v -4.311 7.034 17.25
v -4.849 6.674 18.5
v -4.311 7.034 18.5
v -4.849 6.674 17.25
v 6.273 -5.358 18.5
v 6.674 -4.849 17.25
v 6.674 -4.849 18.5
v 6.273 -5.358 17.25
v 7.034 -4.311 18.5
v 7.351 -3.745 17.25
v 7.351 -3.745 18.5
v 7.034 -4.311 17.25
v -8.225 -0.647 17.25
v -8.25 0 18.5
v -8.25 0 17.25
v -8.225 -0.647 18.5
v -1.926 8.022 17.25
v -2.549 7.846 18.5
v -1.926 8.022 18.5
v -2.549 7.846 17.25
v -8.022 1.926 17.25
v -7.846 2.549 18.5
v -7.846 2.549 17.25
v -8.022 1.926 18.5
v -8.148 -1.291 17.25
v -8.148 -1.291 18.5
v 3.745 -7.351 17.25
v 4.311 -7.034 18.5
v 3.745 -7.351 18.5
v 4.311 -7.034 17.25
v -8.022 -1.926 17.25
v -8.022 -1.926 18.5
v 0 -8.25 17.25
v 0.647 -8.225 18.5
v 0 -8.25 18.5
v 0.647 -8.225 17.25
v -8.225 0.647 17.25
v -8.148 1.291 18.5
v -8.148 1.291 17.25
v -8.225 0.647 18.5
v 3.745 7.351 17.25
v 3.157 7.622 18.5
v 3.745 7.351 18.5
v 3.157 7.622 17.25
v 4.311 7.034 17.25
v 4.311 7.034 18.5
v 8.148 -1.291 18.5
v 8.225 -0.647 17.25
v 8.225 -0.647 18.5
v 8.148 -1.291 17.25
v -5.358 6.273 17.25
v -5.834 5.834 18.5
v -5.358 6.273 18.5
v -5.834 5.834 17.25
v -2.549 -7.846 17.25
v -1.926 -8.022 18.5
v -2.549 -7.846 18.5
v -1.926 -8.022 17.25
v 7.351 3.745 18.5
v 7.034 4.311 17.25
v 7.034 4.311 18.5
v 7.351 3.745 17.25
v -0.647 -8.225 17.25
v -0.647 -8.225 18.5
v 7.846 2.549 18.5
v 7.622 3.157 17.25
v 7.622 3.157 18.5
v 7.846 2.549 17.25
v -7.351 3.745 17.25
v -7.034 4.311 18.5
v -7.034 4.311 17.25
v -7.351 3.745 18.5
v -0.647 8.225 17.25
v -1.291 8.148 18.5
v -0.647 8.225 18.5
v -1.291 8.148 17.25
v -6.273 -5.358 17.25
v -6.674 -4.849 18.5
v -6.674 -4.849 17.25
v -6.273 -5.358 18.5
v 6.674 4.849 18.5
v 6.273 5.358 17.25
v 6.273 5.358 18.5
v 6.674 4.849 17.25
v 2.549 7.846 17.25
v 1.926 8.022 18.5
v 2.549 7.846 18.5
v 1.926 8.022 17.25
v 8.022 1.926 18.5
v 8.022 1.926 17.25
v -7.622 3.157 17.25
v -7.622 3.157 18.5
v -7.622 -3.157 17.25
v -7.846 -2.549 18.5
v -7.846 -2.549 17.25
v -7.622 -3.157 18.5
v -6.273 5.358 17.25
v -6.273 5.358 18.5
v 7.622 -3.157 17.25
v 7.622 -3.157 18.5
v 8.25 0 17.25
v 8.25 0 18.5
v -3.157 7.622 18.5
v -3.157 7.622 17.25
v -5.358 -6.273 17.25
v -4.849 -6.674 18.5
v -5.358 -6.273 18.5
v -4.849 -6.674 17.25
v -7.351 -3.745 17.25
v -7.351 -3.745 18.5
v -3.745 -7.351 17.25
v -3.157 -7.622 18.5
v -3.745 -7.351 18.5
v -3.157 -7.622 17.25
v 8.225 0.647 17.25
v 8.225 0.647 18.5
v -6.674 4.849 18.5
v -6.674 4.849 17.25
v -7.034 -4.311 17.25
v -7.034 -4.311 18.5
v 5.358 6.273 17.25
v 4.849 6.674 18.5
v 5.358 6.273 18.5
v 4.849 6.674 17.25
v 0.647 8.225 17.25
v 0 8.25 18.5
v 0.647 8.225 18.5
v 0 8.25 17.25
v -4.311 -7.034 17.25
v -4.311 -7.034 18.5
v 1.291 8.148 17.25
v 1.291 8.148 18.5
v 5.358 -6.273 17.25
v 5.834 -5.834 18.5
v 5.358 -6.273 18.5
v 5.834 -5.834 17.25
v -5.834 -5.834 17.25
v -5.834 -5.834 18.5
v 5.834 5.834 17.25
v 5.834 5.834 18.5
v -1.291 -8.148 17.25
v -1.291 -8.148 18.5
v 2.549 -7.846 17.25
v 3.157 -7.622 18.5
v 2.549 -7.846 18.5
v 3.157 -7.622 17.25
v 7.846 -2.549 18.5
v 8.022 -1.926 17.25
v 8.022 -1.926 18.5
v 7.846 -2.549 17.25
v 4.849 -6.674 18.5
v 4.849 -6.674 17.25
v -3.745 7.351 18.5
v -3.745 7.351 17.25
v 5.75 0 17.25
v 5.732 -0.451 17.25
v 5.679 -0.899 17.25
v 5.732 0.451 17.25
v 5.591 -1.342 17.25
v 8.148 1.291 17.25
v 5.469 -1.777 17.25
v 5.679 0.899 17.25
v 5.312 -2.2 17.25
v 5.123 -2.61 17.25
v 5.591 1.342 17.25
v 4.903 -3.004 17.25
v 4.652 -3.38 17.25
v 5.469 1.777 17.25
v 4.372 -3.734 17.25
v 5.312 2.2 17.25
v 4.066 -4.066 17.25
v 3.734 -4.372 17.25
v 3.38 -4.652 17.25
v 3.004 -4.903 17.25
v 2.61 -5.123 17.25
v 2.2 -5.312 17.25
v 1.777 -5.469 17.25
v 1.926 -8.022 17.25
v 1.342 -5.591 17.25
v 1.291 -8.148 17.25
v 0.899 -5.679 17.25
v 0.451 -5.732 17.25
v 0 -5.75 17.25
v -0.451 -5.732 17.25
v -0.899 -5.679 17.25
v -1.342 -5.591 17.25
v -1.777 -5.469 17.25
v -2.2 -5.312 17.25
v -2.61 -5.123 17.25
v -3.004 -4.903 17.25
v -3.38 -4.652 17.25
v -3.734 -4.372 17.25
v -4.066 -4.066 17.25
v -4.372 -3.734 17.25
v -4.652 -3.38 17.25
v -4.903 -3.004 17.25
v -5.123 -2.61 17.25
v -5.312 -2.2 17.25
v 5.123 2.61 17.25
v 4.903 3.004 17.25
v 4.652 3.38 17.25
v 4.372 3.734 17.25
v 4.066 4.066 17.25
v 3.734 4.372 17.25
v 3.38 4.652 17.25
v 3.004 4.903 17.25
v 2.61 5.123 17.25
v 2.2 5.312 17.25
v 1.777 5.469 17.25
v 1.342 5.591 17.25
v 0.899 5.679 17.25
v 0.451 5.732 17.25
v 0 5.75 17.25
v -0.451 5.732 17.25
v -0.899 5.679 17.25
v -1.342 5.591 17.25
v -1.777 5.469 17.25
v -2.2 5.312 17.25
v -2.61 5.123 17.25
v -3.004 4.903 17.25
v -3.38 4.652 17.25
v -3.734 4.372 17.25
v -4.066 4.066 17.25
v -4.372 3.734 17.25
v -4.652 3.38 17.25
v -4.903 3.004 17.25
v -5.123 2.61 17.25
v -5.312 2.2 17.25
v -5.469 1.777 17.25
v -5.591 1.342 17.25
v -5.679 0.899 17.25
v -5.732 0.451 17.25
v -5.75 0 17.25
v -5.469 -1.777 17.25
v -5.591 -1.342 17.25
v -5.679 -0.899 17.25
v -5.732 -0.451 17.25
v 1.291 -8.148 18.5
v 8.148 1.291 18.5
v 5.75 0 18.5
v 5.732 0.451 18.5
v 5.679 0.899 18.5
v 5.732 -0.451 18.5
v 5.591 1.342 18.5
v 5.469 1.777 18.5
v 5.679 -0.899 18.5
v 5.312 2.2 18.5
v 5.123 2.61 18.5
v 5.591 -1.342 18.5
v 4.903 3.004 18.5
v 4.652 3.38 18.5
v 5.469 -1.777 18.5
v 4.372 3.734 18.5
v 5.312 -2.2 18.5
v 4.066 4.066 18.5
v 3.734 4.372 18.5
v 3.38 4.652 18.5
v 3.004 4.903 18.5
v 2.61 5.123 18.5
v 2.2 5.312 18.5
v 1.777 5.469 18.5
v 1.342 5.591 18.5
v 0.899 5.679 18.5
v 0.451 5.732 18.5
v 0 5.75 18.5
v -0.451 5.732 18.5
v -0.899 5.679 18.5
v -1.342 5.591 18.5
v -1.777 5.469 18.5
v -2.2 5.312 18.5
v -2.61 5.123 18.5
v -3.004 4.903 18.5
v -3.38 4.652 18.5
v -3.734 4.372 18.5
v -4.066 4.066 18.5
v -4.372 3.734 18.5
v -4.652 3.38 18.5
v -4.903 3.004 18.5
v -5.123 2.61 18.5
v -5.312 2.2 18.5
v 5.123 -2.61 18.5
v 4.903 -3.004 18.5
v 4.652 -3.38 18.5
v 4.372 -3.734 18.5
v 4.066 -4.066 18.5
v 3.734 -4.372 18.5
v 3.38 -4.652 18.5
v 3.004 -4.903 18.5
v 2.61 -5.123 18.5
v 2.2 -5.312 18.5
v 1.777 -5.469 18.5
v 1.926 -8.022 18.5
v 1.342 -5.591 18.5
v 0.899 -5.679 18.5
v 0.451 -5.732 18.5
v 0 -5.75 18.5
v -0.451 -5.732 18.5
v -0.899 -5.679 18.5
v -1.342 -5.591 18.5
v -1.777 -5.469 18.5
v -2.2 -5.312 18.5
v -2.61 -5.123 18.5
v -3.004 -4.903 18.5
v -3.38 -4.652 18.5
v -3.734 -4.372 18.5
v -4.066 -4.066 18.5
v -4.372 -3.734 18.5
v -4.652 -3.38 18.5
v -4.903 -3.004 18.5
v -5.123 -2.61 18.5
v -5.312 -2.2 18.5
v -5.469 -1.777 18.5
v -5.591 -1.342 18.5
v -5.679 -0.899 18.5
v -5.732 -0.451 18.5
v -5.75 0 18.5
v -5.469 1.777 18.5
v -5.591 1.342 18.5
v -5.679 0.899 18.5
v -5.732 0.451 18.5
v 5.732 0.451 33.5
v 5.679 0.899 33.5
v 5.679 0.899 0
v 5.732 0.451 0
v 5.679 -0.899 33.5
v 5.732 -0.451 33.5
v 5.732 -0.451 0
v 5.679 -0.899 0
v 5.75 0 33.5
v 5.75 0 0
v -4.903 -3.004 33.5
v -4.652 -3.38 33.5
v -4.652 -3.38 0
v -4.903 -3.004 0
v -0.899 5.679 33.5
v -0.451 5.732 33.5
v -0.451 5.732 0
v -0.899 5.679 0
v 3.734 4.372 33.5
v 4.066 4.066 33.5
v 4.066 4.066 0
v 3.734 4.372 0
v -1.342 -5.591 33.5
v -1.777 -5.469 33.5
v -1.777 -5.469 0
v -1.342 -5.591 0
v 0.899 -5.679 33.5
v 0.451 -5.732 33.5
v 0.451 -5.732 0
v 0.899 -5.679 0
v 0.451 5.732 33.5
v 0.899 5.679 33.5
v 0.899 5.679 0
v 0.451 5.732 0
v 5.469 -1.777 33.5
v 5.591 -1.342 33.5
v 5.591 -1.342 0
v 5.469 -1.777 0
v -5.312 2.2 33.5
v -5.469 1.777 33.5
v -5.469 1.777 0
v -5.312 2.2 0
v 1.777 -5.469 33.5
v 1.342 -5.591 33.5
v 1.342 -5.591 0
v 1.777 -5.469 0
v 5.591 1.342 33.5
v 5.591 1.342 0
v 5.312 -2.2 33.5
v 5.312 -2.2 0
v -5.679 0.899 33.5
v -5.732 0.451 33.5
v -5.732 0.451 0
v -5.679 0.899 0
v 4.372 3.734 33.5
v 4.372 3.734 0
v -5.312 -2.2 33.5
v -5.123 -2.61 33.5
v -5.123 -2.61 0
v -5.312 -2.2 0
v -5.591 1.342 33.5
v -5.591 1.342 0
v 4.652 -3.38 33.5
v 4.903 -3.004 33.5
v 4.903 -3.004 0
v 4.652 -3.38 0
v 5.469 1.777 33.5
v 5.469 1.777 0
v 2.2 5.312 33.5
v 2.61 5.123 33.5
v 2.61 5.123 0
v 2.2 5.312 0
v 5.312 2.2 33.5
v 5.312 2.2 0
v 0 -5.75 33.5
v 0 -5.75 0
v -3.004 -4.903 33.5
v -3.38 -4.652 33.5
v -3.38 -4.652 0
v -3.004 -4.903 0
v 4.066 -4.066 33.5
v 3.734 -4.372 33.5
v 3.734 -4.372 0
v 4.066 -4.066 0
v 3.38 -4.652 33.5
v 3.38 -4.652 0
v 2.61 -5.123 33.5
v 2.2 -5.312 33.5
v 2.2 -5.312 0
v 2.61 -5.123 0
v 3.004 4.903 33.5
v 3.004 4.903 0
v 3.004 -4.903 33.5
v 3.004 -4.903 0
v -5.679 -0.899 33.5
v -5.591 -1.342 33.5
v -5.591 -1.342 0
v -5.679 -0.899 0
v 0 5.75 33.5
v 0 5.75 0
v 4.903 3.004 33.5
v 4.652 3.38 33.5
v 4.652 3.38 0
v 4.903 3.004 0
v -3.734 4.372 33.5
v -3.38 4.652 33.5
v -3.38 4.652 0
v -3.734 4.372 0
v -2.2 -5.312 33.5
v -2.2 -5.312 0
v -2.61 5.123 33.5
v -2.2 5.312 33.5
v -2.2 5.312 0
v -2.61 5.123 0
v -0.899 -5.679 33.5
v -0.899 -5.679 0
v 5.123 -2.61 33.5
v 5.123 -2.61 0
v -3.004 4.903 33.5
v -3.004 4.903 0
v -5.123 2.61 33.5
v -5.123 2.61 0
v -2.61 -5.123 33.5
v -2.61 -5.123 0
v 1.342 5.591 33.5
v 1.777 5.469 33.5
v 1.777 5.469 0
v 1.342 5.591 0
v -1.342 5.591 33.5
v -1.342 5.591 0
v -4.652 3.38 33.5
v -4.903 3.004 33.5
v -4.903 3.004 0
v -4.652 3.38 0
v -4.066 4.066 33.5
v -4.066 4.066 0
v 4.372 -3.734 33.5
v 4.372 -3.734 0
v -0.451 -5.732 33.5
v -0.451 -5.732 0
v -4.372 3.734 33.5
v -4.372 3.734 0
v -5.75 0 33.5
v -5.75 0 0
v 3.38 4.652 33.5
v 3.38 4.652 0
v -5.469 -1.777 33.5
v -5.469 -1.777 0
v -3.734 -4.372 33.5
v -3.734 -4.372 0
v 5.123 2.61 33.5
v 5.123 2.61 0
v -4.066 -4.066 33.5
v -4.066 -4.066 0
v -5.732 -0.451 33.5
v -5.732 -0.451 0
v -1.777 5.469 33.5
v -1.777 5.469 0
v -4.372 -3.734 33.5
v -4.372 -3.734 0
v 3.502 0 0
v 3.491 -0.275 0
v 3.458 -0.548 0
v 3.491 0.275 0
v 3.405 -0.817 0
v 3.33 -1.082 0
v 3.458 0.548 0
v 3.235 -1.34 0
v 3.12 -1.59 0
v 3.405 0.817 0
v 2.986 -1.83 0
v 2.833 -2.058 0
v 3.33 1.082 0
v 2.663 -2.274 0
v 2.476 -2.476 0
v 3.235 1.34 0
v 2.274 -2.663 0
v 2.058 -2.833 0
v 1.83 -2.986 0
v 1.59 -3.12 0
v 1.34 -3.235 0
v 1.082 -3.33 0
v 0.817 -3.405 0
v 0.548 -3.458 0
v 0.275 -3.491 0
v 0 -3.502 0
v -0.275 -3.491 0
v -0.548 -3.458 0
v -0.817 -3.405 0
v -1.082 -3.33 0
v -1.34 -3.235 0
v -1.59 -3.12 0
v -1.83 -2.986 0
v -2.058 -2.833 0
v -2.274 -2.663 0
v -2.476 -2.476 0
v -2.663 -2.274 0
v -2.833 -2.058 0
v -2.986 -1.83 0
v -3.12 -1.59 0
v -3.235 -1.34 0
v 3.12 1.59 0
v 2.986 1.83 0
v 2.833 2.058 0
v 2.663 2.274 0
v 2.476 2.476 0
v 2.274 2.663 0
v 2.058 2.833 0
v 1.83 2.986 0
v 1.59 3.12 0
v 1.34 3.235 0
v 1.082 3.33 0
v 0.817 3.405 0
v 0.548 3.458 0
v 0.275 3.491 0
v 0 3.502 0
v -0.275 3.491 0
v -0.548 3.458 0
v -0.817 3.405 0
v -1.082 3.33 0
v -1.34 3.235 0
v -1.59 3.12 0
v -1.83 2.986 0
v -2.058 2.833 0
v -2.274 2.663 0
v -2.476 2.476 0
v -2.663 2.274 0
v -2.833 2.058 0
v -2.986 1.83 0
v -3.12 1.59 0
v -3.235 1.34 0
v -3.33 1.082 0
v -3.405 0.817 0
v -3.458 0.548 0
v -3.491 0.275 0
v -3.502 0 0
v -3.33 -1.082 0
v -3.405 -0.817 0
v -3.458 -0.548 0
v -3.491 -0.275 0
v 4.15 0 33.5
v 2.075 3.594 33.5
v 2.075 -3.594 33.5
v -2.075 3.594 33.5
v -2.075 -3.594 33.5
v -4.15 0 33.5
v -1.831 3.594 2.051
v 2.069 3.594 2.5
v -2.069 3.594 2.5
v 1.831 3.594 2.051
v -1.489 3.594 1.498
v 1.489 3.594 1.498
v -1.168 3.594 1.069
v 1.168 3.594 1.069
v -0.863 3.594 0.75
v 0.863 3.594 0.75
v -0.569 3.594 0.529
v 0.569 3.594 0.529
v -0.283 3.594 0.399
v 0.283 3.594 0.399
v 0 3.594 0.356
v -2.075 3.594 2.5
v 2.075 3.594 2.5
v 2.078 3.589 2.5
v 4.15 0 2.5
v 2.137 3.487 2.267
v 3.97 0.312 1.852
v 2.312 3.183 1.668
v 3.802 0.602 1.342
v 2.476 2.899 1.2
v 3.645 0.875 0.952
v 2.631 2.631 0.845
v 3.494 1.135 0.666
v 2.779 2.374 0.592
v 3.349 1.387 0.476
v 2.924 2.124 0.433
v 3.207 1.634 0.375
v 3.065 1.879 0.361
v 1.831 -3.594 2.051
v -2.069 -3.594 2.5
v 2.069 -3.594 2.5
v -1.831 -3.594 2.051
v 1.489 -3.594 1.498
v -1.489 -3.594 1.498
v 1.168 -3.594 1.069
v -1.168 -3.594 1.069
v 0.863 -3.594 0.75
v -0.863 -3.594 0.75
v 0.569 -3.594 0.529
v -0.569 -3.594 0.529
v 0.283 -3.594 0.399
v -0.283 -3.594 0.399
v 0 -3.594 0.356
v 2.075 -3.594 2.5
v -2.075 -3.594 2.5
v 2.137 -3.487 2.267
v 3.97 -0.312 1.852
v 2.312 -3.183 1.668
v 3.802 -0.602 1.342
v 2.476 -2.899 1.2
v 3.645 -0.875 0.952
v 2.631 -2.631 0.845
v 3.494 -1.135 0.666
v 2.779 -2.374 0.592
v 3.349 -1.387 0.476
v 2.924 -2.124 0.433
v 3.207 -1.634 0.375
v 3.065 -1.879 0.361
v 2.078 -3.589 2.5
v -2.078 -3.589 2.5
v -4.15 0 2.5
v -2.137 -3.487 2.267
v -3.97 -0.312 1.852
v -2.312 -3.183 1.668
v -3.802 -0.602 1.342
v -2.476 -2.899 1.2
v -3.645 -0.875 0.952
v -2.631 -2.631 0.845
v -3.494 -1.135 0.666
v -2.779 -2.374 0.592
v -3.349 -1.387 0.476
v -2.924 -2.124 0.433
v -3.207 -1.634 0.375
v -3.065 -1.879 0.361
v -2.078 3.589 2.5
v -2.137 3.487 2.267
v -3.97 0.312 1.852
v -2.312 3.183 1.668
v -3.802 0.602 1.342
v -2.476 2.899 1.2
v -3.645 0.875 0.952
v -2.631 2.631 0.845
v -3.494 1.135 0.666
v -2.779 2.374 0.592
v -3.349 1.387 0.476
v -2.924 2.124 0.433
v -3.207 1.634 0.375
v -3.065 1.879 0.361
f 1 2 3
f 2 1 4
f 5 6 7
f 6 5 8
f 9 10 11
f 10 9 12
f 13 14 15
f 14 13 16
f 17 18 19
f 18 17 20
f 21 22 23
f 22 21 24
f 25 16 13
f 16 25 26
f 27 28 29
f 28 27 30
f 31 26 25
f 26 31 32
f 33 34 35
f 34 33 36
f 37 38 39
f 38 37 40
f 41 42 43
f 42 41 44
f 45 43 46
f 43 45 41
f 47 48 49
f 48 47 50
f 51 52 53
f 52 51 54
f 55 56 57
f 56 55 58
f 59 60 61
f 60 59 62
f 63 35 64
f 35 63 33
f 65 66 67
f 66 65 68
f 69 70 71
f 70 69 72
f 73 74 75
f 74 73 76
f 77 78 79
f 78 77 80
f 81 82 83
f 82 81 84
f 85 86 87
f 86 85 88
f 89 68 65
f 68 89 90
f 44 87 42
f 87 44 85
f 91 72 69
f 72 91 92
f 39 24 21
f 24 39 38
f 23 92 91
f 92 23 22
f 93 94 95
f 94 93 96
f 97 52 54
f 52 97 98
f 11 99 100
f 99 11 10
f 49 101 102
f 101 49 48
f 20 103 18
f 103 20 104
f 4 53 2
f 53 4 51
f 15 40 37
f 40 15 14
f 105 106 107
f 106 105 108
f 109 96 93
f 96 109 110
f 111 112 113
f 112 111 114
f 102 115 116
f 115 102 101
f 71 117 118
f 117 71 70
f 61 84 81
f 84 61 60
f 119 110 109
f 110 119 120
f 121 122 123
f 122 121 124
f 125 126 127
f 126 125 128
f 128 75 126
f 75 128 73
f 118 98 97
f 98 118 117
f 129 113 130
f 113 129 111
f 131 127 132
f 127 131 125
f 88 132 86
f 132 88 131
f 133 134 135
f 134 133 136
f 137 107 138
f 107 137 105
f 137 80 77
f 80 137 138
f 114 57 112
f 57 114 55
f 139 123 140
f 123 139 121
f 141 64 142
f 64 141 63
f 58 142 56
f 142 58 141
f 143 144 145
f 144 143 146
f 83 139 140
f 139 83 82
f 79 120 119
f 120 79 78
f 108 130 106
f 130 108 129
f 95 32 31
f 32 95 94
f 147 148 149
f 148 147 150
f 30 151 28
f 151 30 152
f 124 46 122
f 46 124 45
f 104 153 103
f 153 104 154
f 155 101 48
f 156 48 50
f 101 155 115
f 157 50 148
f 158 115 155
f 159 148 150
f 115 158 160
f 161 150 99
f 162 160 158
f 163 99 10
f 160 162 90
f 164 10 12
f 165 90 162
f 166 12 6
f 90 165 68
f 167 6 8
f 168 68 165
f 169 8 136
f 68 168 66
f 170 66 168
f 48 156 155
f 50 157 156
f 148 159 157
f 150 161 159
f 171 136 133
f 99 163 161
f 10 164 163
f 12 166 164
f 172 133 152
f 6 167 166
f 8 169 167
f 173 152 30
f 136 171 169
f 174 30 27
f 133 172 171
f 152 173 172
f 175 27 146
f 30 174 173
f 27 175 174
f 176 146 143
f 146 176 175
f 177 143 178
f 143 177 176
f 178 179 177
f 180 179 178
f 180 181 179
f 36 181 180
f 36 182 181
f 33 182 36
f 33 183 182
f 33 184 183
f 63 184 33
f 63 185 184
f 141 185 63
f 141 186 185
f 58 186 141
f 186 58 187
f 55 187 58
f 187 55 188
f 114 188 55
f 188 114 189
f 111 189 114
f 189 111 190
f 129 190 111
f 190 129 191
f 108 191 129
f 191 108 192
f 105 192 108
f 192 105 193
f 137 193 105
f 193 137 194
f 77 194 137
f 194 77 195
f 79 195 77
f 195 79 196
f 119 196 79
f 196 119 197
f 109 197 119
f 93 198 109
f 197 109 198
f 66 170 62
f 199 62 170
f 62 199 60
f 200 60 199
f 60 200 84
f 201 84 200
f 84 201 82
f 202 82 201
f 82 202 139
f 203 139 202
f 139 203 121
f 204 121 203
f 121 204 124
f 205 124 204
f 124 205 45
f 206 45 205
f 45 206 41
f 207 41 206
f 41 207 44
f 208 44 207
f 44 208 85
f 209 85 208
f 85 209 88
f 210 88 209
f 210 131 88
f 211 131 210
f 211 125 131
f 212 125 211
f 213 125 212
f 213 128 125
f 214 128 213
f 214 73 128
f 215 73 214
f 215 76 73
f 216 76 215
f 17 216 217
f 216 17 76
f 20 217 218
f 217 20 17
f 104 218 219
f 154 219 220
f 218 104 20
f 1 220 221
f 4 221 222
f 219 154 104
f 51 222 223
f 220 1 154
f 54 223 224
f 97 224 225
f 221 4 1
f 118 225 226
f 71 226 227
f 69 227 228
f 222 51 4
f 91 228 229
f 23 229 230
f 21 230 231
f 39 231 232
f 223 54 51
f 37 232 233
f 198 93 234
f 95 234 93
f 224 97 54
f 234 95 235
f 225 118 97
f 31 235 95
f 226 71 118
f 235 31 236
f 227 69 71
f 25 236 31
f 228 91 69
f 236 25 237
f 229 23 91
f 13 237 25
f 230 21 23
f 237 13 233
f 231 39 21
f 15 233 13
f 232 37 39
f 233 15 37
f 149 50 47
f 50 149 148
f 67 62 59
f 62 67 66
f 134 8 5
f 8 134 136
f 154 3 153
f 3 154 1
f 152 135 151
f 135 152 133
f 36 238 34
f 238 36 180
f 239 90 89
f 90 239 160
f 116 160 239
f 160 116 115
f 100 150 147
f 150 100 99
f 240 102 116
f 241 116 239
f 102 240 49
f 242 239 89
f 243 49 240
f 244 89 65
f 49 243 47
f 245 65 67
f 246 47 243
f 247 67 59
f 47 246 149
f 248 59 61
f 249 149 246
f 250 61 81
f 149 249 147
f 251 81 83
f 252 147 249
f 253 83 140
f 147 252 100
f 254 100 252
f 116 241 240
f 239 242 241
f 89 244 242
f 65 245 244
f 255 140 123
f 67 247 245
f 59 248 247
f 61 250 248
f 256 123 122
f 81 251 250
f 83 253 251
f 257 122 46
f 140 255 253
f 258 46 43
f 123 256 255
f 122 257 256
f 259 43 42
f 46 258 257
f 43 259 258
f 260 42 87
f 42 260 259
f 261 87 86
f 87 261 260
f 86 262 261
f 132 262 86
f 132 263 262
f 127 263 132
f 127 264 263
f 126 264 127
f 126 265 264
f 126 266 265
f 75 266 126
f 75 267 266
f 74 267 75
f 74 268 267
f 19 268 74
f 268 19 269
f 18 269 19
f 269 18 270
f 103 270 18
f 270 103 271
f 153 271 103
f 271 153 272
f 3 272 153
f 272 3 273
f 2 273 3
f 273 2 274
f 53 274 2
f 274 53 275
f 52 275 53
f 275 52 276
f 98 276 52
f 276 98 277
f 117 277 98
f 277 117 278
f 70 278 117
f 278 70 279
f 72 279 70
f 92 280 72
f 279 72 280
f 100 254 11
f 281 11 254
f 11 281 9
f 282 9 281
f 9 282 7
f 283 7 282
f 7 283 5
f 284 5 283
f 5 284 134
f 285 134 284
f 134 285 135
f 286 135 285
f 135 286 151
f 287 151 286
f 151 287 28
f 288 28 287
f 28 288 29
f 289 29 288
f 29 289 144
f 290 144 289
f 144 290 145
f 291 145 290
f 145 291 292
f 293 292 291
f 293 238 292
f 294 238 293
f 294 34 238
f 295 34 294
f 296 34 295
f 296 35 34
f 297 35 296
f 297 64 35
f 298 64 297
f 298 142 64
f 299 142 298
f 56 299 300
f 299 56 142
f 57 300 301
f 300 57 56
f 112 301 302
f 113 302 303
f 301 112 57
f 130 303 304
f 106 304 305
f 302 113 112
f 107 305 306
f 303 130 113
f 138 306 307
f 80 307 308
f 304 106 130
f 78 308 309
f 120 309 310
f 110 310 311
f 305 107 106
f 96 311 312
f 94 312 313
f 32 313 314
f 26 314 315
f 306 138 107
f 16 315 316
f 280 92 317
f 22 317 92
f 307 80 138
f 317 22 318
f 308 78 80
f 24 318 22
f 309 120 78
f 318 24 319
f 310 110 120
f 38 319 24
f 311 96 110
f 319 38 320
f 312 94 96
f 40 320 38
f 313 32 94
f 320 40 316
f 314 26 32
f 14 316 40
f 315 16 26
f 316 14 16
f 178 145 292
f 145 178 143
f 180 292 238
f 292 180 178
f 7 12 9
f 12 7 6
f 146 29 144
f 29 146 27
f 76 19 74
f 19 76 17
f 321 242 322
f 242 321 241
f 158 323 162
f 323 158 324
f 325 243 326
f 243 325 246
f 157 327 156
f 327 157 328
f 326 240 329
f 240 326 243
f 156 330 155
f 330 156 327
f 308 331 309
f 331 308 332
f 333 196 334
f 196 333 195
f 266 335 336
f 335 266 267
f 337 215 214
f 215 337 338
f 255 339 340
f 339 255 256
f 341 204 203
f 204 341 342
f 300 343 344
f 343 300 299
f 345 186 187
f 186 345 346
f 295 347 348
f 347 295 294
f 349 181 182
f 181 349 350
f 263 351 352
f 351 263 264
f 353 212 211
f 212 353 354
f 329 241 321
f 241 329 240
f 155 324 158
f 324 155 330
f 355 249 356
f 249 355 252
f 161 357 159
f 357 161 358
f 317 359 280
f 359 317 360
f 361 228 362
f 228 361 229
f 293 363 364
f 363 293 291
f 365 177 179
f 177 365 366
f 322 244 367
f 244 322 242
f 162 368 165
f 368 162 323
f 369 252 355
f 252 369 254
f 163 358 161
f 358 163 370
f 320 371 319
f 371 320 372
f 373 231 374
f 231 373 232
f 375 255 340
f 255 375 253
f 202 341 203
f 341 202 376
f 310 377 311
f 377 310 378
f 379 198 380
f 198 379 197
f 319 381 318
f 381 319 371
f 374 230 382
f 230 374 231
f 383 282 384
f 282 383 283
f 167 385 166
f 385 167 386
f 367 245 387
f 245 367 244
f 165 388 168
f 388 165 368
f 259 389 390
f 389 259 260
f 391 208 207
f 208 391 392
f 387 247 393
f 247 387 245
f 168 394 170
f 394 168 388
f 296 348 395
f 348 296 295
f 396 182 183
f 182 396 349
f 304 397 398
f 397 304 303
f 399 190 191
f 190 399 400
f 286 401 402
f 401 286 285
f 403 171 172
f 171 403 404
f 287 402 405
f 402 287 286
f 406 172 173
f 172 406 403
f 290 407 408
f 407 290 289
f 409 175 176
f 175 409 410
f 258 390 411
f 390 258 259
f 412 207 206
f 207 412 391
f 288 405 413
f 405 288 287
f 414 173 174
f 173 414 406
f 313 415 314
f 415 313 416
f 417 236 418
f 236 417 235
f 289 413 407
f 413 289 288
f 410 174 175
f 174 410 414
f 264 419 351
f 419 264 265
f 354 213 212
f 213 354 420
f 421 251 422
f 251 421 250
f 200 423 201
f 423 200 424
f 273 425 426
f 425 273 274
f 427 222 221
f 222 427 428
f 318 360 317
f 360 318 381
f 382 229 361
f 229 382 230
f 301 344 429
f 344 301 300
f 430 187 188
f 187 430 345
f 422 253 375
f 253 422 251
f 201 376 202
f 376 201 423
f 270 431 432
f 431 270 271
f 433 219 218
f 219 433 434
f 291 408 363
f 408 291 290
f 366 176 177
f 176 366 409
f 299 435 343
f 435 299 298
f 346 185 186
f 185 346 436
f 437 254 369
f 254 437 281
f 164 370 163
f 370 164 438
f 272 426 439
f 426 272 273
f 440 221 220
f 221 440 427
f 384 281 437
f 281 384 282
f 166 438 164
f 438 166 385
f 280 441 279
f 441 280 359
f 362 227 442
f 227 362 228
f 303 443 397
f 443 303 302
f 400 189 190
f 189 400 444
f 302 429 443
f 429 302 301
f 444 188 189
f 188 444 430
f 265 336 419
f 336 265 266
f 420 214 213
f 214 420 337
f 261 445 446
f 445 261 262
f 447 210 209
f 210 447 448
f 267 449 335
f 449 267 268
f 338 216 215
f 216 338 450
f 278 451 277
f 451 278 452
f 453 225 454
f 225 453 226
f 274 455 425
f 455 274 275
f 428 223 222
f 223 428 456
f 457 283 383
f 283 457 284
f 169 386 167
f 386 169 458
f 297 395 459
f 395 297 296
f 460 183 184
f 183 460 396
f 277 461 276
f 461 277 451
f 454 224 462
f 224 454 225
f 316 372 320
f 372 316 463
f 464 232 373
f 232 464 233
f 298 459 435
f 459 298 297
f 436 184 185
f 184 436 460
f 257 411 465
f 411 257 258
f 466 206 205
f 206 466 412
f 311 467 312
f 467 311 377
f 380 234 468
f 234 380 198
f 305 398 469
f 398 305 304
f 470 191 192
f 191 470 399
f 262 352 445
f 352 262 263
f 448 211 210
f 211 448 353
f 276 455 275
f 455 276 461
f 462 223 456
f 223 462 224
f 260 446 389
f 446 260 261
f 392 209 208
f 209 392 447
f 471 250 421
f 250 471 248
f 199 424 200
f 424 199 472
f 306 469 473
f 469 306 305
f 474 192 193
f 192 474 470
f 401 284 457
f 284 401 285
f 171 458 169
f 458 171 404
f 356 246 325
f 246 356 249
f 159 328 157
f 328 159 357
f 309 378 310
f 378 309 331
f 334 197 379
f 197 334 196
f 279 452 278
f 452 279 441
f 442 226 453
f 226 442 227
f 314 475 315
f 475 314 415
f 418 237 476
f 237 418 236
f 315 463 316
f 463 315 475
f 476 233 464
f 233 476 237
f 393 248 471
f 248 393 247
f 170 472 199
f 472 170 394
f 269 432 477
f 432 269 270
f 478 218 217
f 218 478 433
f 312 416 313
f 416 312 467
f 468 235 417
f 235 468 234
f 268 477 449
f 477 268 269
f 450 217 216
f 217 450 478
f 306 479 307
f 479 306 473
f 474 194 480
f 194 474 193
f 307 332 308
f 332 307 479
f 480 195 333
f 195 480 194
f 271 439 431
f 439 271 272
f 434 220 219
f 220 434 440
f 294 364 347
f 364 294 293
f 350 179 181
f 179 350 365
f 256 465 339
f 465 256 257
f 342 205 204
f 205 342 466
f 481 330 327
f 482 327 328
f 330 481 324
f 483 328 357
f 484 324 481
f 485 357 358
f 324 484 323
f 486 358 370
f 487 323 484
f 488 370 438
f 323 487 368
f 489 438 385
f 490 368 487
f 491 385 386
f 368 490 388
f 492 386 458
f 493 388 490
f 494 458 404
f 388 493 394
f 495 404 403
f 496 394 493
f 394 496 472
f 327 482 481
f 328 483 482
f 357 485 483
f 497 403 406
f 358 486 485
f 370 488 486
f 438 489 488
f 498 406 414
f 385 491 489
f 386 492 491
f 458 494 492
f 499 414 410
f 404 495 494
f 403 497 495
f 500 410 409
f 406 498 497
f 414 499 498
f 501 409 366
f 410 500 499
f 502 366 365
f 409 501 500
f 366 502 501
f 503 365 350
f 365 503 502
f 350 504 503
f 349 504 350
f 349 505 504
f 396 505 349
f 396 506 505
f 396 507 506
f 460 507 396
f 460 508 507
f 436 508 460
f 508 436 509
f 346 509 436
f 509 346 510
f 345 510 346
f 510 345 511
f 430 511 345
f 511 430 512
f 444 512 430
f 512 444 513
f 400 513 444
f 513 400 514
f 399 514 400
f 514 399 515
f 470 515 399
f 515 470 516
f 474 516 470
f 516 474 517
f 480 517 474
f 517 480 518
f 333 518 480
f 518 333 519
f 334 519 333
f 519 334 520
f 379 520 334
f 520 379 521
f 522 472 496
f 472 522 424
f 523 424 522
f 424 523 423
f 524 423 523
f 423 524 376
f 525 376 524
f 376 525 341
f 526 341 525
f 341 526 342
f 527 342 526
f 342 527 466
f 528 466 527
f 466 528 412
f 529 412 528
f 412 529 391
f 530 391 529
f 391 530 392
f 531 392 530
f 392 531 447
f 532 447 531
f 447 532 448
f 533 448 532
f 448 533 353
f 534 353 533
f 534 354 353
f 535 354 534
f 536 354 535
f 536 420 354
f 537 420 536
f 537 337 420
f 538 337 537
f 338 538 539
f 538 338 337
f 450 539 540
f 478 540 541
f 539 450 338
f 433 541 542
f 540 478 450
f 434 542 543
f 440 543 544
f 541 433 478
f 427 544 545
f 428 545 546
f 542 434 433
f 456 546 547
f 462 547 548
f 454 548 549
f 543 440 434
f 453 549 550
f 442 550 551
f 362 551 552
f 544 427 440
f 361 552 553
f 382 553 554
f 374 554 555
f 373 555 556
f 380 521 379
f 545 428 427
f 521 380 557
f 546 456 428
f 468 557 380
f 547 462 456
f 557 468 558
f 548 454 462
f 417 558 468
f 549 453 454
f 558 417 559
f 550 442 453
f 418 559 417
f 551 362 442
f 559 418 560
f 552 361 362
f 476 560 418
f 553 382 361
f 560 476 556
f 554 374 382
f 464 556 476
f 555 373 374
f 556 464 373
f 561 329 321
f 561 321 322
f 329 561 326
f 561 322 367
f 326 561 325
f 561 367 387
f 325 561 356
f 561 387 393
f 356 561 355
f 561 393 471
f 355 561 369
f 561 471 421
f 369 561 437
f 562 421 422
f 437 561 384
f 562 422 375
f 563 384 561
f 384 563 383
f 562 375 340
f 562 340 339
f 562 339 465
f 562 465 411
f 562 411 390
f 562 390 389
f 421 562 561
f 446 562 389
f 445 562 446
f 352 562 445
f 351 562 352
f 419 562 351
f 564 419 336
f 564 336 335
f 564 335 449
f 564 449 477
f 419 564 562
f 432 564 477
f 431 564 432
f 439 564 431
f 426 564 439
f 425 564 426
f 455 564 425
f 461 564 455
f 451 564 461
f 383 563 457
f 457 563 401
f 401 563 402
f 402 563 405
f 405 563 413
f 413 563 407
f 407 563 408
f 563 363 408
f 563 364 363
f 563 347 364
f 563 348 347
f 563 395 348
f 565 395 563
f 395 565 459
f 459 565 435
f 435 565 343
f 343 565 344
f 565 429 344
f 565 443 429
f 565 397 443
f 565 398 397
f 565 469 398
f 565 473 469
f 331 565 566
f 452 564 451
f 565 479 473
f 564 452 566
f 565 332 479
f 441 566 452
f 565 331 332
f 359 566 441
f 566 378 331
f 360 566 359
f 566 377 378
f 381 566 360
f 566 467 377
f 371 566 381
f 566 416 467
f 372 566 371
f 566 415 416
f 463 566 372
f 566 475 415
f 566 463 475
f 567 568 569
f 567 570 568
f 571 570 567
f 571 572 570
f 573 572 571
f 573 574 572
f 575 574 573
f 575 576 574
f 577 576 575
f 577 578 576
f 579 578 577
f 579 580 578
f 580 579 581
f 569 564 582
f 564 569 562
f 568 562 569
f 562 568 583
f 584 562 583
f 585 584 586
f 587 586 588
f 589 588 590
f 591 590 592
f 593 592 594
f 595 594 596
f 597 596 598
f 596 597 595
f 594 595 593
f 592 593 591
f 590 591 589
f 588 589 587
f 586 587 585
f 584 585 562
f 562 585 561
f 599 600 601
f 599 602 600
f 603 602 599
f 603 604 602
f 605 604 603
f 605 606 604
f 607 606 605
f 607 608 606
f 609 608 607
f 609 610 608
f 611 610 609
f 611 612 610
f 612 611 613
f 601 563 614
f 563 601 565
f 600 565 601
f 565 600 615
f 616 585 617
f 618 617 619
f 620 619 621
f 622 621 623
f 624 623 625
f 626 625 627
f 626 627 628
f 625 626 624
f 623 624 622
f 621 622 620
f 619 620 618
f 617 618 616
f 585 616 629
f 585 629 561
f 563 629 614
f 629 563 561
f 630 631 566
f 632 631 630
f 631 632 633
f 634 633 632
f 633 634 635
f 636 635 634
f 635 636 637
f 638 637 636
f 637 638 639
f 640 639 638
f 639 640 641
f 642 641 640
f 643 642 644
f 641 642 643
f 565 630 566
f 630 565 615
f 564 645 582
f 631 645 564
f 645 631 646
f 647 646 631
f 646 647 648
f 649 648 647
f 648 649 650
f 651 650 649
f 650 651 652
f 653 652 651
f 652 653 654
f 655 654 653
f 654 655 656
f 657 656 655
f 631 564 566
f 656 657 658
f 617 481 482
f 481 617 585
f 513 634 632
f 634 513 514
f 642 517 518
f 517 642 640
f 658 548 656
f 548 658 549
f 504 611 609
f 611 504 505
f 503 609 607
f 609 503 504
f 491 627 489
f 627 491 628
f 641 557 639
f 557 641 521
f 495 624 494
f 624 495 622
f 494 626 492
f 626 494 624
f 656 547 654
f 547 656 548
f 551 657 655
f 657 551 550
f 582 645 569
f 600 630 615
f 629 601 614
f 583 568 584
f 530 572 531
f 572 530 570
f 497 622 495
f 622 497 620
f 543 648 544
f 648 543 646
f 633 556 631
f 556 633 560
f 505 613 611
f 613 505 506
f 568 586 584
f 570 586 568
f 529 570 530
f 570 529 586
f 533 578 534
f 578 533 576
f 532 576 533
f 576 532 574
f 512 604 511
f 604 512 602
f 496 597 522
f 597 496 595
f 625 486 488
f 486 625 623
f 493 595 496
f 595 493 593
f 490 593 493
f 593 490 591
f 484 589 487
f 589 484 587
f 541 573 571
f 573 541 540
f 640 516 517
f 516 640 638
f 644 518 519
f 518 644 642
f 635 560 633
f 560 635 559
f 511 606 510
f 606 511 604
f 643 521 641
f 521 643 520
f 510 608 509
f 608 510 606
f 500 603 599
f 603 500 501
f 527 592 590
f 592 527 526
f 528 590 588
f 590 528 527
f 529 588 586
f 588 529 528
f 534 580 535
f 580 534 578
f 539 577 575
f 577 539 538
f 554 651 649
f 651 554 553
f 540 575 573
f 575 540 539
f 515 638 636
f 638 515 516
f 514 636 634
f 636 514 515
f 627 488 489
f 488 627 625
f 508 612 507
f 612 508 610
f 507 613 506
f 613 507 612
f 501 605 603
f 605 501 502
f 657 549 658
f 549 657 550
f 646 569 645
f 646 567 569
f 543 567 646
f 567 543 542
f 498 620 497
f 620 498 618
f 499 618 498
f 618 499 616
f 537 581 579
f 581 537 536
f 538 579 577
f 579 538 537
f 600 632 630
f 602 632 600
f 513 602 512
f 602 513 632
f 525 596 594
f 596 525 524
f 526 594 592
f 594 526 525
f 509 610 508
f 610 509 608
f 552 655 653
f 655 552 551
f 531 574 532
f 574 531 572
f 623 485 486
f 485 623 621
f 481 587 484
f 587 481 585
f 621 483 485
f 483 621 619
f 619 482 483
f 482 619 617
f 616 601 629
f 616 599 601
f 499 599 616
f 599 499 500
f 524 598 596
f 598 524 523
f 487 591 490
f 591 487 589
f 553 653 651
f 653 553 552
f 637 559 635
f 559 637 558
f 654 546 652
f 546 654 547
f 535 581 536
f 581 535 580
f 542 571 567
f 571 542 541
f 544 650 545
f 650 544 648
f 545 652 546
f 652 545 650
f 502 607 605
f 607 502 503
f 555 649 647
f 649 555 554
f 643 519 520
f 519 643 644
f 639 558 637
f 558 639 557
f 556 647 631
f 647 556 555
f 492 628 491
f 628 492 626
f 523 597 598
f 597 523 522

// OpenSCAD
// file: common.scad
// Measurements and routines common across adapters.

band_full_thickness = 1.25;    // thickest point of the band
band_full_diameter = 16.5;  // diameter at widest point of band

// profile = [
//     [0,0],
//     [band_edge_diameter / 2, 0],
//     [band_full_diameter / 2, (band_full_thickness - band_edge_thickness) / 2],
//     [band_full_diameter / 2, band_full_thickness - ((band_full_thickness - band_edge_thickness) / 2)],
//     [band_edge_diameter / 2, band_full_thickness],
//     [0,band_full_thickness],
// ];

profile = [
    [0,0],
    [band_full_diameter / 2, 0],
    [band_full_diameter / 2, band_full_thickness],
    [0,band_full_thickness],
];

module band() {
    rotate_extrude($fn=80) polygon(points=profile);
}
// main file
// Plotter adapter for the KOH-I-NOOR Toison D'Or pencil
//
// Modified by Sasha Kovar <sasha-thing@arcocene.org>
// from a design by Brian Boucheron <brian@boucheron.org>

include <common.scad>;

body_outer_diameter = 11.5; // outer diameter of the main body
body_inner_diameter = 8.3;
body_height = 13.5;

translate([0,0,33.5]) 
rotate([180,0,0])
translate([0,0,15]) 
difference() {
    union() {
        band();
        cylinder(r=body_outer_diameter/2, h=body_height + 5, $fn=80);
        translate([0,0,-15]) cylinder(r=body_outer_diameter/2, h=body_height + 5, $fn=80);
    }

    translate([0,0,2])
    union() {
        translate([0,0,-20]) cylinder(d=body_inner_diameter, h=34, $fn=6);
        intersection() {
            translate([0,0,-5.5]) cylinder(d=body_inner_diameter, h=24, $fn=6);
            translate([0,0,14]) cylinder(d1=body_inner_diameter, d2=0, h=16, $fn=80);
        }
    }
}
